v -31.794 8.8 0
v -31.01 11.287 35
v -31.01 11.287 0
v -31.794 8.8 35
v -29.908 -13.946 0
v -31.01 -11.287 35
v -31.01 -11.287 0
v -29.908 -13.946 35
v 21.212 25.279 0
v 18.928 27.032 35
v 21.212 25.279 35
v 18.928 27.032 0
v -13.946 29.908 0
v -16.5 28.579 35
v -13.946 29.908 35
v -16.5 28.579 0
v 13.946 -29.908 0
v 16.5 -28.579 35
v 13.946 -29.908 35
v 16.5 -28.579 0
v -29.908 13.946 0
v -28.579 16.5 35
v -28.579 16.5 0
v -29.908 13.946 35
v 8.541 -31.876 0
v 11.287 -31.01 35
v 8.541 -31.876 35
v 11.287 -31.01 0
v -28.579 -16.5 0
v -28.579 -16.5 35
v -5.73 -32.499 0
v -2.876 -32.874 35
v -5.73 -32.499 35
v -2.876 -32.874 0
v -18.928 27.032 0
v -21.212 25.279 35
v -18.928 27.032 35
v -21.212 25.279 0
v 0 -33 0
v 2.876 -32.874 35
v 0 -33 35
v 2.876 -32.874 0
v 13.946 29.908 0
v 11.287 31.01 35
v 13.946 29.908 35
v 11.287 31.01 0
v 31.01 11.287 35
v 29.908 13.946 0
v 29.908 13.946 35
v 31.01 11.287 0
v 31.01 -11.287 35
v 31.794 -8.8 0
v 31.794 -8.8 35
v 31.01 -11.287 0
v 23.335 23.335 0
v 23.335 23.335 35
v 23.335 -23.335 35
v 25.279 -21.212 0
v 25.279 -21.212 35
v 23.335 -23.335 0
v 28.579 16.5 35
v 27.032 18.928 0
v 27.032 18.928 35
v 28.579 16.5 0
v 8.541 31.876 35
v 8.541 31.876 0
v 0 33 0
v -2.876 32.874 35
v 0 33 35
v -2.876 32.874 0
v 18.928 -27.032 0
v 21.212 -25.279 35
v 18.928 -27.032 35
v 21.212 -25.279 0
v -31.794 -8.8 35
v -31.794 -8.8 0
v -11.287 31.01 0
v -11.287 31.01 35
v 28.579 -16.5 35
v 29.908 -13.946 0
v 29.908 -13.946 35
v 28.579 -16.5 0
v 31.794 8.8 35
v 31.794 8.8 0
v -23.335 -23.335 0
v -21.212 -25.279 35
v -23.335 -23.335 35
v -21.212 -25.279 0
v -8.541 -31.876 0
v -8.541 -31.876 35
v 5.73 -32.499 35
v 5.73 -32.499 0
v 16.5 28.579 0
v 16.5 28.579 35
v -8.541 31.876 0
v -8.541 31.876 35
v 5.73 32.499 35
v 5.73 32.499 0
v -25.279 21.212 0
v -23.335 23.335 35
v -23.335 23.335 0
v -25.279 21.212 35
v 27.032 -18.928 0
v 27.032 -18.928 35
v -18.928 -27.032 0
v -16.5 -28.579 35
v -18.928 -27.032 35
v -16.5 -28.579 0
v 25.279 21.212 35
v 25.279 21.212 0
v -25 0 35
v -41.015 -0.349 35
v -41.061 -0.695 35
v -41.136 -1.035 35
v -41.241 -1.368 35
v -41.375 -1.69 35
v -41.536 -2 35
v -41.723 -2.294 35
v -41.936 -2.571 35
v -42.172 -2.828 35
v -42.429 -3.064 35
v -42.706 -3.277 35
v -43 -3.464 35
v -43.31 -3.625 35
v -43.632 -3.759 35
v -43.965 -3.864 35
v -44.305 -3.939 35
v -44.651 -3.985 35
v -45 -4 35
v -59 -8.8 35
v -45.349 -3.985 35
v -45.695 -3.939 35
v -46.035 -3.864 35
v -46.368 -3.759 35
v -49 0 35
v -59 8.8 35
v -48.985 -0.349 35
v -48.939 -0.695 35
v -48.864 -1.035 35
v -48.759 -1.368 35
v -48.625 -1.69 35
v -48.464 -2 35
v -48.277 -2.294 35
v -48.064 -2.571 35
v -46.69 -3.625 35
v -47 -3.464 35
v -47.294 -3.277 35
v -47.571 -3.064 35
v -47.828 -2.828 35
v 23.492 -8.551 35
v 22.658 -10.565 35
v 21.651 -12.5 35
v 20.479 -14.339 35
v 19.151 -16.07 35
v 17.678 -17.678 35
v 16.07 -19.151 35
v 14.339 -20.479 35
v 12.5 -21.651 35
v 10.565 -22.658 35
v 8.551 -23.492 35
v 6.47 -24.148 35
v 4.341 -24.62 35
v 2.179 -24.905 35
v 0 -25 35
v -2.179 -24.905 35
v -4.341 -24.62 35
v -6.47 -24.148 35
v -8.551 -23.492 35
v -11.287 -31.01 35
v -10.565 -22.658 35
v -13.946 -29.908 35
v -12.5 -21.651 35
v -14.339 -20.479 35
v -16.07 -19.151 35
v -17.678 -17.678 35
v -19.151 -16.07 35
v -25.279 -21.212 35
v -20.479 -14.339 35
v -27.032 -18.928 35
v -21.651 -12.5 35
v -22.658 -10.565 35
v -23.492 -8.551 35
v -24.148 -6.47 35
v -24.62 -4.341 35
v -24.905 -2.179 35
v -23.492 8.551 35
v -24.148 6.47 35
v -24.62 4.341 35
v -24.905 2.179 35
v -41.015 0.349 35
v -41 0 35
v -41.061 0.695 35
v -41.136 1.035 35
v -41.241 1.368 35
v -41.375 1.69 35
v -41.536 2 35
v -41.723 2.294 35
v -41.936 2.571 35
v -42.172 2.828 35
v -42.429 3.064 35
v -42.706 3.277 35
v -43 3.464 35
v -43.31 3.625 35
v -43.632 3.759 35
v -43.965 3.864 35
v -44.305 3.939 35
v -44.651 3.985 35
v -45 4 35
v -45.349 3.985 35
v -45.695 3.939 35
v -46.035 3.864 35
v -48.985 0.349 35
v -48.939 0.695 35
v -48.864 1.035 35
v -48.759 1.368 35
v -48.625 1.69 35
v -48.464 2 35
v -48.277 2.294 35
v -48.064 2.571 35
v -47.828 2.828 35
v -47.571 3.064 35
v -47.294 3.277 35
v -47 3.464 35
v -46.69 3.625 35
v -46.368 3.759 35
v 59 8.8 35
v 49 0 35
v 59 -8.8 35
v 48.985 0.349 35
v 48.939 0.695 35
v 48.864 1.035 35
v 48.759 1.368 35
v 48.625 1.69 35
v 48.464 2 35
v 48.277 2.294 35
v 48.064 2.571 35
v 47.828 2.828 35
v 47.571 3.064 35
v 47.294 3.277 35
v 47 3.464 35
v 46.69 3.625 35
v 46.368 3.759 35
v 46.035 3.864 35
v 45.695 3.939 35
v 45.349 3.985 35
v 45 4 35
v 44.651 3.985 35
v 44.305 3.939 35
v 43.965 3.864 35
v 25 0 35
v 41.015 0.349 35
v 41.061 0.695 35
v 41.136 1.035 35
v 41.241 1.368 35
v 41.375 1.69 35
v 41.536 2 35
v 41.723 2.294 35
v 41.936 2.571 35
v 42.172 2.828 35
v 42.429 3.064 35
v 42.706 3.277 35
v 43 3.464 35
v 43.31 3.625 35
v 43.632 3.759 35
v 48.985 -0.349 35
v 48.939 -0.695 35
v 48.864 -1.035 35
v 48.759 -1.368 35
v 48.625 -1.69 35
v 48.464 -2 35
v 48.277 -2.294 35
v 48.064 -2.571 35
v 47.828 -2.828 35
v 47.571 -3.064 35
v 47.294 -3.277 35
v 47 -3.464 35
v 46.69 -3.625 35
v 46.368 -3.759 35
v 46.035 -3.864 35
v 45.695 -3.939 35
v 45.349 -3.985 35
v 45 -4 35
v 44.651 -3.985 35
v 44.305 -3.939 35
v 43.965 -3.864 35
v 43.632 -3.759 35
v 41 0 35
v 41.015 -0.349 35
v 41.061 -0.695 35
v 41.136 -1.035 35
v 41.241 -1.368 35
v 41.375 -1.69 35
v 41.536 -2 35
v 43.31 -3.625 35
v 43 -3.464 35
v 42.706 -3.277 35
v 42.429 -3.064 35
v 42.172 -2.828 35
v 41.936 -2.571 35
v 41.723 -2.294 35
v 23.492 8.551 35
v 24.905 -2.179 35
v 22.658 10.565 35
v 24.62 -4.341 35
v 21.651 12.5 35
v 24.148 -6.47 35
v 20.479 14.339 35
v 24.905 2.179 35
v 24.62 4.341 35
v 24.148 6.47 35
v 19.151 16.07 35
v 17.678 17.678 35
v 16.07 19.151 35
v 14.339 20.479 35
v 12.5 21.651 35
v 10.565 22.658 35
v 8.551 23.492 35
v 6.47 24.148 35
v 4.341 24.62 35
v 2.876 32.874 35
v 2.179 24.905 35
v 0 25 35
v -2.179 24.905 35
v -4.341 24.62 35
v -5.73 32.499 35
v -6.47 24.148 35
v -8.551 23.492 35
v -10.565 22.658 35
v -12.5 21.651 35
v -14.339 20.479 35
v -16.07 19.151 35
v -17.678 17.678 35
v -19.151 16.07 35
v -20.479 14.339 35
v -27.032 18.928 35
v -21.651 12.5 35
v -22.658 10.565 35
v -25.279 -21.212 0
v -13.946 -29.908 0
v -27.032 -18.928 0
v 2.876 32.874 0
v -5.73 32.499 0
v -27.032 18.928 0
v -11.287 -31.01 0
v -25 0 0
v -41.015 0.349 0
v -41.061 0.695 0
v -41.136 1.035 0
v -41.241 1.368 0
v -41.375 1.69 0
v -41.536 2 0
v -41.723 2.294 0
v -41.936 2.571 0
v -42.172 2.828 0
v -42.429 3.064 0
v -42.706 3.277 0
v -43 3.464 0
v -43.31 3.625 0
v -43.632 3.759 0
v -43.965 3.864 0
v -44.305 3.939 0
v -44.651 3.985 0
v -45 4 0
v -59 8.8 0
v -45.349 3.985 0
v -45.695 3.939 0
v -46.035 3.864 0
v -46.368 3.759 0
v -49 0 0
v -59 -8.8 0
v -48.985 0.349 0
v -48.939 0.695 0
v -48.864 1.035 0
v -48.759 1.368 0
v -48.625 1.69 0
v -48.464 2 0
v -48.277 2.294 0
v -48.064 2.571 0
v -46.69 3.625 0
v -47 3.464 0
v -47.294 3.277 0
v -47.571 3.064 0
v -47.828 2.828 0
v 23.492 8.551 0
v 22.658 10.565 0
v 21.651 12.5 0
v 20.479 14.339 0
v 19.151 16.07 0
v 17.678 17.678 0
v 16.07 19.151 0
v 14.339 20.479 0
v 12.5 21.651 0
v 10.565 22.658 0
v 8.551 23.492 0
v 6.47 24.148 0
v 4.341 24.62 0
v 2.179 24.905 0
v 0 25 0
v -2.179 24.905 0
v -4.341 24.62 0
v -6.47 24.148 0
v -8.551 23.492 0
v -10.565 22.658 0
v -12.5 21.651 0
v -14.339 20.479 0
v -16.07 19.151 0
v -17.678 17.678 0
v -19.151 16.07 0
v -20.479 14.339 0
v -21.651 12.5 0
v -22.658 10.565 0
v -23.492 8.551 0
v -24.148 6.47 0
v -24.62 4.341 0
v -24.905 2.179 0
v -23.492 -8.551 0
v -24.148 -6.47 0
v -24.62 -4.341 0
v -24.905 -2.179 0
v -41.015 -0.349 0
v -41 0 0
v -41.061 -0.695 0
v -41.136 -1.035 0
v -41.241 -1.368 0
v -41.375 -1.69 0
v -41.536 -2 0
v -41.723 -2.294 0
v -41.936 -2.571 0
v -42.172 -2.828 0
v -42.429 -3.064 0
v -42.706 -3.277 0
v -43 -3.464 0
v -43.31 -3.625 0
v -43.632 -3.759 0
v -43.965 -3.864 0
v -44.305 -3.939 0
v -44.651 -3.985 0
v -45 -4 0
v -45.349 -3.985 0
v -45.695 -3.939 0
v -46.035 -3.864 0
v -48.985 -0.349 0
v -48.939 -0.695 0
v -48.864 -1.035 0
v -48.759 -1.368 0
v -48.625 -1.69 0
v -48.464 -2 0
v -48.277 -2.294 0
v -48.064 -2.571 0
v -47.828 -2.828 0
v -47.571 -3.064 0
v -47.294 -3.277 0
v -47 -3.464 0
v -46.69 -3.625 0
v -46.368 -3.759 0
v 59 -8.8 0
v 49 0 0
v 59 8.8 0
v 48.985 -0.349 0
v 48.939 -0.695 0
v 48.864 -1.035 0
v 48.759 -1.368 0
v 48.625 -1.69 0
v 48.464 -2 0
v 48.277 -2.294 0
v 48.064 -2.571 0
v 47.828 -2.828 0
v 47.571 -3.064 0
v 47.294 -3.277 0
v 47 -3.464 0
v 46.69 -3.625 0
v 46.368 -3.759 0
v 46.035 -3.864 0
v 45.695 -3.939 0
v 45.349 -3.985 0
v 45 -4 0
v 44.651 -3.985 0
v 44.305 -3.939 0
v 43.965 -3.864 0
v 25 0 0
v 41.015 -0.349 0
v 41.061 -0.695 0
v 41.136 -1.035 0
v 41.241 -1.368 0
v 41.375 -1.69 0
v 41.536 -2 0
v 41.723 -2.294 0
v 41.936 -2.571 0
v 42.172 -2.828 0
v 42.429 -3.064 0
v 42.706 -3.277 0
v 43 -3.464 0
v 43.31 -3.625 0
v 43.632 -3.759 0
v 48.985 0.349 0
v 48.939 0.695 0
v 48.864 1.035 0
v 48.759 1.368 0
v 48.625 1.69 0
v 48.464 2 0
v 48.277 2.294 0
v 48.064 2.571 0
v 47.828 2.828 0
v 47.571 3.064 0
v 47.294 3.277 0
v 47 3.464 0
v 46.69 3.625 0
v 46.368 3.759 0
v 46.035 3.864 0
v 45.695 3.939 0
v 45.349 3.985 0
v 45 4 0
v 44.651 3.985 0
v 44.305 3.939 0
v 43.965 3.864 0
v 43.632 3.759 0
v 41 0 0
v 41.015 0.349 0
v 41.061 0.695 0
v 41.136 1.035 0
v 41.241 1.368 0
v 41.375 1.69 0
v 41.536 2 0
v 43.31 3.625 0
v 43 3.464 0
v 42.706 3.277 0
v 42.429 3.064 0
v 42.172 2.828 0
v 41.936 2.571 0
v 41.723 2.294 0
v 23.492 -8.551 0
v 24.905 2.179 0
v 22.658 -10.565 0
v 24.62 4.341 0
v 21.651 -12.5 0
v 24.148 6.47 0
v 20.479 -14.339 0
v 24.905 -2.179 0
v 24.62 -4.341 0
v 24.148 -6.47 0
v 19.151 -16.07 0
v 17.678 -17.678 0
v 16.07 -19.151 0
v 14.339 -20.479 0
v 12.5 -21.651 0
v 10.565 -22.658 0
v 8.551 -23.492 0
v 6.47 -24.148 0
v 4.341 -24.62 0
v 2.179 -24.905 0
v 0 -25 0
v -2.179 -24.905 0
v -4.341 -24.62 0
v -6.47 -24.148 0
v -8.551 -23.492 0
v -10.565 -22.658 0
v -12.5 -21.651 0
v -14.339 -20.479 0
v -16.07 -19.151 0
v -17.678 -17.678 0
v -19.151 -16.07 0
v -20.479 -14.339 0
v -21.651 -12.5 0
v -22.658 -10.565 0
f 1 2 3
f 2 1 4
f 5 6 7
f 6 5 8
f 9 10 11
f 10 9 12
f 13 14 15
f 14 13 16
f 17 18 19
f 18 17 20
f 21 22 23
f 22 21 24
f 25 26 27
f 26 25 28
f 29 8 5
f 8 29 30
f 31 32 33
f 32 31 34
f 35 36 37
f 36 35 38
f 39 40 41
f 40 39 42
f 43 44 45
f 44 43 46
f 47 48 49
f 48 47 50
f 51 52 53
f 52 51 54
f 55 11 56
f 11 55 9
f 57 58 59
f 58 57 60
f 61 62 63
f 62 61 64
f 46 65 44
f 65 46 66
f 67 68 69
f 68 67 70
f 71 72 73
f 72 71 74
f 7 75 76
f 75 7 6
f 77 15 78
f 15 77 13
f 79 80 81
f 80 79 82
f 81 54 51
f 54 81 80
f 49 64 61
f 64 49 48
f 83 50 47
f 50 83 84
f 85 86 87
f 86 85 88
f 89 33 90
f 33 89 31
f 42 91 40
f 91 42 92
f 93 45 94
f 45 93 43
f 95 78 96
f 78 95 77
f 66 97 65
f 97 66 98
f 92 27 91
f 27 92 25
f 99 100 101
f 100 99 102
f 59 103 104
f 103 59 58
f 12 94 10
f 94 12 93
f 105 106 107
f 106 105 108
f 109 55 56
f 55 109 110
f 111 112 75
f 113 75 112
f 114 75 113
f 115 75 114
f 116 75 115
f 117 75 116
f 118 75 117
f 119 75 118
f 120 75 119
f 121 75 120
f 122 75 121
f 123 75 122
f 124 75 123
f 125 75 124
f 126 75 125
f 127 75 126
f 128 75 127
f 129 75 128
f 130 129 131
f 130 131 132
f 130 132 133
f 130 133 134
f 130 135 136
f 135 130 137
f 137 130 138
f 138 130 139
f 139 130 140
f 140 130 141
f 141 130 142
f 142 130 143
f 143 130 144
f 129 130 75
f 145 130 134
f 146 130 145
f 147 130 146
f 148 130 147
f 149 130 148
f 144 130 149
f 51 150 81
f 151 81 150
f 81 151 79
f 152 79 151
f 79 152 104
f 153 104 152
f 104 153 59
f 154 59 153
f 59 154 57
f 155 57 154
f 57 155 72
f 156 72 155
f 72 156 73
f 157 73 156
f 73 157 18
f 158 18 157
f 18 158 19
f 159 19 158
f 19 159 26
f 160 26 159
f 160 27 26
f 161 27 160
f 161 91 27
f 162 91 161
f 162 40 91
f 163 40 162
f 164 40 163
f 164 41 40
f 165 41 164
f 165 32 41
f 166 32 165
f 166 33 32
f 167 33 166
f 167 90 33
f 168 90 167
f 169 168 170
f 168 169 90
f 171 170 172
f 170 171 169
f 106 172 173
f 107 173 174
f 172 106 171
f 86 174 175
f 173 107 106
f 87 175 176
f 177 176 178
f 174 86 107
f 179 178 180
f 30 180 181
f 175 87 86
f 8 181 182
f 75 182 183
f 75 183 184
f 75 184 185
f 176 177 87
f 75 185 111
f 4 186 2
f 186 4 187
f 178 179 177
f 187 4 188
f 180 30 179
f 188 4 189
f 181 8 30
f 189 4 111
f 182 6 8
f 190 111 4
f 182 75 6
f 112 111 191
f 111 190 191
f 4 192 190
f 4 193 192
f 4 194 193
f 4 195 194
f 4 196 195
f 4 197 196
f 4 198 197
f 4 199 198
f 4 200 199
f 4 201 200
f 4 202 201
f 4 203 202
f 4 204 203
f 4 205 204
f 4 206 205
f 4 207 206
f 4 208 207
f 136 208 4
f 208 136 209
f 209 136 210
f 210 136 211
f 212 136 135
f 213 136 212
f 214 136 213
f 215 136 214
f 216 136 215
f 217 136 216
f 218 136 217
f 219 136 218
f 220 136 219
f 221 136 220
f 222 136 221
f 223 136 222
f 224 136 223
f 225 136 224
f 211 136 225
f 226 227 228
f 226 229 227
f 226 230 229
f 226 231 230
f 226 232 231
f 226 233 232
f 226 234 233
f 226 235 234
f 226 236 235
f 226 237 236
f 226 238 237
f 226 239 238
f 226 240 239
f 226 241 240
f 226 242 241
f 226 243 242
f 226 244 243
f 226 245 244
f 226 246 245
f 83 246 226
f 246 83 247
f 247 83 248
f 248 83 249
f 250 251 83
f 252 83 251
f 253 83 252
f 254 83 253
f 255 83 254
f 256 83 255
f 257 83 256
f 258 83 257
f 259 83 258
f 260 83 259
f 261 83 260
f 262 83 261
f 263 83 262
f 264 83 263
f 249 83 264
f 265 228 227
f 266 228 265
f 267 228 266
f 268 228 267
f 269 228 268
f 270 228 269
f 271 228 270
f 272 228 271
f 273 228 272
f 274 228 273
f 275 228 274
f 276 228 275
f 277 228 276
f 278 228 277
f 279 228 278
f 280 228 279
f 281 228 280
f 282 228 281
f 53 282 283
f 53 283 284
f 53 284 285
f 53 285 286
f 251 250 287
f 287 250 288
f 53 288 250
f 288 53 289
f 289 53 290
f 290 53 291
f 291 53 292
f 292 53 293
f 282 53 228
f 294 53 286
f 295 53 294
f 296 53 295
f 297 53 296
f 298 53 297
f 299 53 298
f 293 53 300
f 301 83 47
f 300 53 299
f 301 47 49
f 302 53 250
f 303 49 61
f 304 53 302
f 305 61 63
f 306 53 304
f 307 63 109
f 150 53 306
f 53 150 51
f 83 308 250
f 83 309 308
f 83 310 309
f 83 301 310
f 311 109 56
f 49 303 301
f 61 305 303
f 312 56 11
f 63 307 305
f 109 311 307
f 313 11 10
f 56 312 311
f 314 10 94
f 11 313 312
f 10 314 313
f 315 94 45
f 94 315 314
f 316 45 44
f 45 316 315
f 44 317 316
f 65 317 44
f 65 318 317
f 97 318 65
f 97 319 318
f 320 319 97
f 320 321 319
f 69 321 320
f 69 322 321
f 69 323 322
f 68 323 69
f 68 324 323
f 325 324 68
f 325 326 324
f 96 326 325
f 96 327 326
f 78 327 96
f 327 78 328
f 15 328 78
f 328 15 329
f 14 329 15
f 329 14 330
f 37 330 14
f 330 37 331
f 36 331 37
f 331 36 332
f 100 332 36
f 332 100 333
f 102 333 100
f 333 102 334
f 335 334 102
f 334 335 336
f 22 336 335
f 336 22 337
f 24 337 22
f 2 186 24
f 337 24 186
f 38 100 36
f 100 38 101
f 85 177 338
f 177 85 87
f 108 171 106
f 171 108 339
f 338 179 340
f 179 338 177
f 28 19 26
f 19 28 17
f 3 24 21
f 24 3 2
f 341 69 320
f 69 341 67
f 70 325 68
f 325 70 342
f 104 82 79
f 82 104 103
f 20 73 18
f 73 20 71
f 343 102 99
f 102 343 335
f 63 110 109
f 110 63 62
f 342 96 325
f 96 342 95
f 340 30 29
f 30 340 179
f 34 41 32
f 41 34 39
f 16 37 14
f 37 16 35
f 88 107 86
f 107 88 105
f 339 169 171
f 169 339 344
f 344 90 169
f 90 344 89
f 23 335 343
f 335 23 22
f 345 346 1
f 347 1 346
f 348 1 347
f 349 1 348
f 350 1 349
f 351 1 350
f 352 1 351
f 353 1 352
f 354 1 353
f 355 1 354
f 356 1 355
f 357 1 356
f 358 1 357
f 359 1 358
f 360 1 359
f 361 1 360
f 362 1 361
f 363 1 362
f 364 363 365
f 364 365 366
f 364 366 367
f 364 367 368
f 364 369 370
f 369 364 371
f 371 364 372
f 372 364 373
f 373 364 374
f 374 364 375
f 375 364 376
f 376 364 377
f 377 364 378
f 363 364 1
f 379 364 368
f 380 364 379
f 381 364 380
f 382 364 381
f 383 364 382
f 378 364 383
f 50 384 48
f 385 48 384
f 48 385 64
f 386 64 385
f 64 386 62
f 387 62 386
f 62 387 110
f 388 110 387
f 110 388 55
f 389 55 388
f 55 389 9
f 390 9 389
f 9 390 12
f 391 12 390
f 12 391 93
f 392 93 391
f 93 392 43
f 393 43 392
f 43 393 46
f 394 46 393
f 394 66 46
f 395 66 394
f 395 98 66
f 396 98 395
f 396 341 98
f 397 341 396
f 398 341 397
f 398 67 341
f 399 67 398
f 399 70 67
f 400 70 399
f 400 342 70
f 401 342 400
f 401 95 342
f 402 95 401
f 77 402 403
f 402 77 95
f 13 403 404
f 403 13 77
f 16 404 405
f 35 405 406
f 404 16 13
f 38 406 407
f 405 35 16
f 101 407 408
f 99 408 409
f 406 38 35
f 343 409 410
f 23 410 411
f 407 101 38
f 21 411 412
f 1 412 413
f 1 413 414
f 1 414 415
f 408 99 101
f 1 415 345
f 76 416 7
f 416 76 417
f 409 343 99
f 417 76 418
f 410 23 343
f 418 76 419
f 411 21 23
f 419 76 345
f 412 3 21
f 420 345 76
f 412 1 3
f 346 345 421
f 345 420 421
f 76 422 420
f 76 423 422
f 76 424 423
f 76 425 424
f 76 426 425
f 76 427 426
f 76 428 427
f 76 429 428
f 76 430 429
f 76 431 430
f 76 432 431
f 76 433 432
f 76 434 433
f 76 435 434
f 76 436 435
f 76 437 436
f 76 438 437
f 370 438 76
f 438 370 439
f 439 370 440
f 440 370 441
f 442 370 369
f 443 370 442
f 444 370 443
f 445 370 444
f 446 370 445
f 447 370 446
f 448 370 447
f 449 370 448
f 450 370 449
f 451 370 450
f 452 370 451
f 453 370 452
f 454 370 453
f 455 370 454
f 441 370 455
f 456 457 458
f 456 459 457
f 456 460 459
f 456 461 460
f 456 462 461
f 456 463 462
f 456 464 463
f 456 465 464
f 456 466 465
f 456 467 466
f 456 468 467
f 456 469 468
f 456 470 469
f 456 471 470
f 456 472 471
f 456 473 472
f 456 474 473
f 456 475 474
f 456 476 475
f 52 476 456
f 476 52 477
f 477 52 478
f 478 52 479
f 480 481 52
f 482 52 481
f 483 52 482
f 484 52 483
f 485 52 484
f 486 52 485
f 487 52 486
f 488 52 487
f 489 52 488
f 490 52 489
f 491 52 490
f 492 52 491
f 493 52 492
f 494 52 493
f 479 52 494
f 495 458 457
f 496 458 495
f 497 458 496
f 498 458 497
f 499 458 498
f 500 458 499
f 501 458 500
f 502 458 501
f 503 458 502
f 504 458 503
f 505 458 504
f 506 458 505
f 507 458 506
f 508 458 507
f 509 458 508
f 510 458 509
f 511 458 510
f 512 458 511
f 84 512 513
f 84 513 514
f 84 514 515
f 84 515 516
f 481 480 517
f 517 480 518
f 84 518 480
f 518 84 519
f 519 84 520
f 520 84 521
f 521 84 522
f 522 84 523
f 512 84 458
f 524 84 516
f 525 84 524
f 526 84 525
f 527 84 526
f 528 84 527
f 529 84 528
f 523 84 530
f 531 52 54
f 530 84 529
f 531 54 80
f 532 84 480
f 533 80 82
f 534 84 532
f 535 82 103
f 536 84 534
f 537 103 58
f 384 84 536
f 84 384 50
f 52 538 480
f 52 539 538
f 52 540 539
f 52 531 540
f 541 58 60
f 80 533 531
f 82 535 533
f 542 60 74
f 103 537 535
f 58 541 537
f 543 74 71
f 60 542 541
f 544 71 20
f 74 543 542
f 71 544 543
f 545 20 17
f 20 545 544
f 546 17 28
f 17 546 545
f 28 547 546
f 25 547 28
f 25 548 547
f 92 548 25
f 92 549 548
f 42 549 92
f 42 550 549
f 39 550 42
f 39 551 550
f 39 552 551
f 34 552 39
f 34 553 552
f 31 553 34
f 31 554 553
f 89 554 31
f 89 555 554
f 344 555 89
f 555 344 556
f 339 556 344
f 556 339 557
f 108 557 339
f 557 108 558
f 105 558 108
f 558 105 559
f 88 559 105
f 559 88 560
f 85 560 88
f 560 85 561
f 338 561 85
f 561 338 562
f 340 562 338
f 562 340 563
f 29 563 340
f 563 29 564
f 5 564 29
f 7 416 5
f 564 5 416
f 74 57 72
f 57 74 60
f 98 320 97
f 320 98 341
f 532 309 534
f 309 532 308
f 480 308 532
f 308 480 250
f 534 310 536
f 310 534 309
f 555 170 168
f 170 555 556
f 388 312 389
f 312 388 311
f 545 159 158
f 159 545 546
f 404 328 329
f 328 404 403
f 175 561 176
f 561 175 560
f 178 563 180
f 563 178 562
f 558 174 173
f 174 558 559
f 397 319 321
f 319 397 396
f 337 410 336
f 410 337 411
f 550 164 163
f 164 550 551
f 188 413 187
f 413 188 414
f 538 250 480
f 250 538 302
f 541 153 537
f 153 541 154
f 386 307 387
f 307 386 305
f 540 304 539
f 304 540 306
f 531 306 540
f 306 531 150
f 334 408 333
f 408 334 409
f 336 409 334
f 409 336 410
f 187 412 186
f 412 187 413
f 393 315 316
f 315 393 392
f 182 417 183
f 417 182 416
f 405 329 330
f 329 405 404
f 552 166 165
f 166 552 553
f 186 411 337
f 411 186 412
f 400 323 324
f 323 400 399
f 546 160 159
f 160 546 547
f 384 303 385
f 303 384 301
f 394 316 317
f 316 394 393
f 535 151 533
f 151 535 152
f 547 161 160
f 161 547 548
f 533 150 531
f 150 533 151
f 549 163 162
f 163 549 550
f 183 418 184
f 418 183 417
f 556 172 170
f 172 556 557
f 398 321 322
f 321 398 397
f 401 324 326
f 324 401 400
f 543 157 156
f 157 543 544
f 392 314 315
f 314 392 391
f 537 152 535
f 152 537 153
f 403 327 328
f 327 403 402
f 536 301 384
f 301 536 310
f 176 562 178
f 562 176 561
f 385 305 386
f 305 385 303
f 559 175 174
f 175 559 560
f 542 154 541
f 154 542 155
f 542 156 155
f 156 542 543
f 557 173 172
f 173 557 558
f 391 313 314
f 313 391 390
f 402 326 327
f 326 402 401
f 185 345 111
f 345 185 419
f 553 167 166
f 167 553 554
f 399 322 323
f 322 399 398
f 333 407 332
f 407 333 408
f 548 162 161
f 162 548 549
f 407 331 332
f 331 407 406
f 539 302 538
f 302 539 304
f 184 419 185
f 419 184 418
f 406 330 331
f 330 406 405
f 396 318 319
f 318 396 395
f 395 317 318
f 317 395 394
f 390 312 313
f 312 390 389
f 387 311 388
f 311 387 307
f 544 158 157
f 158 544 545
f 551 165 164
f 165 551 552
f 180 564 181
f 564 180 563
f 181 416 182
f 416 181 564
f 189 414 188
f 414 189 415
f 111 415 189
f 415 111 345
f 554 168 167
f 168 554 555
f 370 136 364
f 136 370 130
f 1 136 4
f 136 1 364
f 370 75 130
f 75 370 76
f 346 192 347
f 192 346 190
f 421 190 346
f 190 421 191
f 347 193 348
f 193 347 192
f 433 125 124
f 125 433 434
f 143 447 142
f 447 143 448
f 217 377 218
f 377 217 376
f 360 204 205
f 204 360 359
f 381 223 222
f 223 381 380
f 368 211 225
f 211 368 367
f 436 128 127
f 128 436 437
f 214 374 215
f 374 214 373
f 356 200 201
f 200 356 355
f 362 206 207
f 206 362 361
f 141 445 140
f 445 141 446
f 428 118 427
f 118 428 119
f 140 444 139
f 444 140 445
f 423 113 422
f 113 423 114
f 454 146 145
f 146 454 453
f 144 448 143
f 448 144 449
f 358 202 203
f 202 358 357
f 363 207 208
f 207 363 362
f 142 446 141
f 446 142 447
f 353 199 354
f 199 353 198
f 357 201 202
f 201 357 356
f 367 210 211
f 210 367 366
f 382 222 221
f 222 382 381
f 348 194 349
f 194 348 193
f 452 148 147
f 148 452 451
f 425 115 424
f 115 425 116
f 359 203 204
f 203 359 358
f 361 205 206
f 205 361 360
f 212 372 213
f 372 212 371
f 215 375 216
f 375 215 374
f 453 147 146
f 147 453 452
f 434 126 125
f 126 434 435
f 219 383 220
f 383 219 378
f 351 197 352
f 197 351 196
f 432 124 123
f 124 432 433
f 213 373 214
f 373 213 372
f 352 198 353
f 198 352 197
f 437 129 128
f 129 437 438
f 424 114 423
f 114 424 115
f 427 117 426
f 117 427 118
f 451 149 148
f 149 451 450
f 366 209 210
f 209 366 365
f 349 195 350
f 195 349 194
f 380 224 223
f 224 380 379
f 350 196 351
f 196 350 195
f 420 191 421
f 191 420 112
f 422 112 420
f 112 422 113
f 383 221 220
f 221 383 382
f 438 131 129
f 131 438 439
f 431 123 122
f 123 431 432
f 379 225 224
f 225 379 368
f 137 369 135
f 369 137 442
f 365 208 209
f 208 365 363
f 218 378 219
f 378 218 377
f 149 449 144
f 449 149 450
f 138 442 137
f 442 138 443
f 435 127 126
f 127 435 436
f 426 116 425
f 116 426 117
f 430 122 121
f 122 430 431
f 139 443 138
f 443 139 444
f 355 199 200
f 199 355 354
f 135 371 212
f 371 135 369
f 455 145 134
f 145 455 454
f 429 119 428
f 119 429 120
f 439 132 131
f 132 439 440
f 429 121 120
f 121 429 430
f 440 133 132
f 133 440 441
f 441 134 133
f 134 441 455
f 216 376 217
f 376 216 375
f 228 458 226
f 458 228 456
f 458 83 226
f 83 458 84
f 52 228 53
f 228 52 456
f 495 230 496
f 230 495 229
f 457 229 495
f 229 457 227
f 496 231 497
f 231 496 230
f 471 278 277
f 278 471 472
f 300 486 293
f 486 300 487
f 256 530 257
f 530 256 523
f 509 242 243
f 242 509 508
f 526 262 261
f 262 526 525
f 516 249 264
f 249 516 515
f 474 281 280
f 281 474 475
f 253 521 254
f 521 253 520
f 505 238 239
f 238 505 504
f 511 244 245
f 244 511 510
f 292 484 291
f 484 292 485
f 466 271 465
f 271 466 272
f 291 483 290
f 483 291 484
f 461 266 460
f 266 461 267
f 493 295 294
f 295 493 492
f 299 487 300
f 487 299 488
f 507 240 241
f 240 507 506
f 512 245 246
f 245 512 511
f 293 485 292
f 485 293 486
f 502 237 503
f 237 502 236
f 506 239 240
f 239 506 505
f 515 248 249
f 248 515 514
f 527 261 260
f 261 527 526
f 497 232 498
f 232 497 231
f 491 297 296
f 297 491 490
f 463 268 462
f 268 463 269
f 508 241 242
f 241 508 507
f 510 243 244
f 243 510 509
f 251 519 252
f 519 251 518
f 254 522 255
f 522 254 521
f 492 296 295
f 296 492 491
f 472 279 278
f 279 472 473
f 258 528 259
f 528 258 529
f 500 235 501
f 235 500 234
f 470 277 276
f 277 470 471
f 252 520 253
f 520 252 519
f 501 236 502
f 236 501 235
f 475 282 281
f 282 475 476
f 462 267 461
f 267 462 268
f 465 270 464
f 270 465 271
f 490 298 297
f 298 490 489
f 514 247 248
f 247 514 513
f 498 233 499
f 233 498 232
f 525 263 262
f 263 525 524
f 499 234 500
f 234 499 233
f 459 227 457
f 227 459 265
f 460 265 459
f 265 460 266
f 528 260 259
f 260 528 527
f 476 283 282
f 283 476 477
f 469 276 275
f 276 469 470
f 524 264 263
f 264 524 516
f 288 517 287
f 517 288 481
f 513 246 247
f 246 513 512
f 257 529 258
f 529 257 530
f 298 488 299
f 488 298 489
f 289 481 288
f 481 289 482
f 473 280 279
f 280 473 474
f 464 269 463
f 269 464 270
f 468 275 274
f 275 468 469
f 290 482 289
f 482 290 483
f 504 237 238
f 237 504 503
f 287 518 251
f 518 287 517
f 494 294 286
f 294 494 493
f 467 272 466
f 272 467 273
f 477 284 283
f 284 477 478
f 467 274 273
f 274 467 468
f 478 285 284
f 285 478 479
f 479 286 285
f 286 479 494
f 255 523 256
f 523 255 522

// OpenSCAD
// OpenSCAD pipe clamp type B
// Units: millimeters

pipe_diameter_mm = 50;
clamp_thickness_mm = 8;
clamp_width_mm = 35;
ear_length_mm = 28;
bolt_diameter_mm = 8;

$fn = 72;

module clamp_ring() {
    difference() {
        cylinder(h = clamp_width_mm, r = pipe_diameter_mm / 2 + clamp_thickness_mm);
        translate([0, 0, -1])
            cylinder(h = clamp_width_mm + 2, r = pipe_diameter_mm / 2);
    }
}

module ears() {
    outer_r = pipe_diameter_mm / 2 + clamp_thickness_mm;
    for (side = [-1, 1]) {
        translate([side * (outer_r + ear_length_mm / 2 - 2), 0, clamp_width_mm / 2])
            difference() {
                cube([ear_length_mm, clamp_thickness_mm * 2.2, clamp_width_mm], center = true);
                rotate([0, 0, 0])
                    cylinder(h = clamp_width_mm + 2, r = bolt_diameter_mm / 2, center = true);
            }
    }
}

union() {
    clamp_ring();
    ears();
}
